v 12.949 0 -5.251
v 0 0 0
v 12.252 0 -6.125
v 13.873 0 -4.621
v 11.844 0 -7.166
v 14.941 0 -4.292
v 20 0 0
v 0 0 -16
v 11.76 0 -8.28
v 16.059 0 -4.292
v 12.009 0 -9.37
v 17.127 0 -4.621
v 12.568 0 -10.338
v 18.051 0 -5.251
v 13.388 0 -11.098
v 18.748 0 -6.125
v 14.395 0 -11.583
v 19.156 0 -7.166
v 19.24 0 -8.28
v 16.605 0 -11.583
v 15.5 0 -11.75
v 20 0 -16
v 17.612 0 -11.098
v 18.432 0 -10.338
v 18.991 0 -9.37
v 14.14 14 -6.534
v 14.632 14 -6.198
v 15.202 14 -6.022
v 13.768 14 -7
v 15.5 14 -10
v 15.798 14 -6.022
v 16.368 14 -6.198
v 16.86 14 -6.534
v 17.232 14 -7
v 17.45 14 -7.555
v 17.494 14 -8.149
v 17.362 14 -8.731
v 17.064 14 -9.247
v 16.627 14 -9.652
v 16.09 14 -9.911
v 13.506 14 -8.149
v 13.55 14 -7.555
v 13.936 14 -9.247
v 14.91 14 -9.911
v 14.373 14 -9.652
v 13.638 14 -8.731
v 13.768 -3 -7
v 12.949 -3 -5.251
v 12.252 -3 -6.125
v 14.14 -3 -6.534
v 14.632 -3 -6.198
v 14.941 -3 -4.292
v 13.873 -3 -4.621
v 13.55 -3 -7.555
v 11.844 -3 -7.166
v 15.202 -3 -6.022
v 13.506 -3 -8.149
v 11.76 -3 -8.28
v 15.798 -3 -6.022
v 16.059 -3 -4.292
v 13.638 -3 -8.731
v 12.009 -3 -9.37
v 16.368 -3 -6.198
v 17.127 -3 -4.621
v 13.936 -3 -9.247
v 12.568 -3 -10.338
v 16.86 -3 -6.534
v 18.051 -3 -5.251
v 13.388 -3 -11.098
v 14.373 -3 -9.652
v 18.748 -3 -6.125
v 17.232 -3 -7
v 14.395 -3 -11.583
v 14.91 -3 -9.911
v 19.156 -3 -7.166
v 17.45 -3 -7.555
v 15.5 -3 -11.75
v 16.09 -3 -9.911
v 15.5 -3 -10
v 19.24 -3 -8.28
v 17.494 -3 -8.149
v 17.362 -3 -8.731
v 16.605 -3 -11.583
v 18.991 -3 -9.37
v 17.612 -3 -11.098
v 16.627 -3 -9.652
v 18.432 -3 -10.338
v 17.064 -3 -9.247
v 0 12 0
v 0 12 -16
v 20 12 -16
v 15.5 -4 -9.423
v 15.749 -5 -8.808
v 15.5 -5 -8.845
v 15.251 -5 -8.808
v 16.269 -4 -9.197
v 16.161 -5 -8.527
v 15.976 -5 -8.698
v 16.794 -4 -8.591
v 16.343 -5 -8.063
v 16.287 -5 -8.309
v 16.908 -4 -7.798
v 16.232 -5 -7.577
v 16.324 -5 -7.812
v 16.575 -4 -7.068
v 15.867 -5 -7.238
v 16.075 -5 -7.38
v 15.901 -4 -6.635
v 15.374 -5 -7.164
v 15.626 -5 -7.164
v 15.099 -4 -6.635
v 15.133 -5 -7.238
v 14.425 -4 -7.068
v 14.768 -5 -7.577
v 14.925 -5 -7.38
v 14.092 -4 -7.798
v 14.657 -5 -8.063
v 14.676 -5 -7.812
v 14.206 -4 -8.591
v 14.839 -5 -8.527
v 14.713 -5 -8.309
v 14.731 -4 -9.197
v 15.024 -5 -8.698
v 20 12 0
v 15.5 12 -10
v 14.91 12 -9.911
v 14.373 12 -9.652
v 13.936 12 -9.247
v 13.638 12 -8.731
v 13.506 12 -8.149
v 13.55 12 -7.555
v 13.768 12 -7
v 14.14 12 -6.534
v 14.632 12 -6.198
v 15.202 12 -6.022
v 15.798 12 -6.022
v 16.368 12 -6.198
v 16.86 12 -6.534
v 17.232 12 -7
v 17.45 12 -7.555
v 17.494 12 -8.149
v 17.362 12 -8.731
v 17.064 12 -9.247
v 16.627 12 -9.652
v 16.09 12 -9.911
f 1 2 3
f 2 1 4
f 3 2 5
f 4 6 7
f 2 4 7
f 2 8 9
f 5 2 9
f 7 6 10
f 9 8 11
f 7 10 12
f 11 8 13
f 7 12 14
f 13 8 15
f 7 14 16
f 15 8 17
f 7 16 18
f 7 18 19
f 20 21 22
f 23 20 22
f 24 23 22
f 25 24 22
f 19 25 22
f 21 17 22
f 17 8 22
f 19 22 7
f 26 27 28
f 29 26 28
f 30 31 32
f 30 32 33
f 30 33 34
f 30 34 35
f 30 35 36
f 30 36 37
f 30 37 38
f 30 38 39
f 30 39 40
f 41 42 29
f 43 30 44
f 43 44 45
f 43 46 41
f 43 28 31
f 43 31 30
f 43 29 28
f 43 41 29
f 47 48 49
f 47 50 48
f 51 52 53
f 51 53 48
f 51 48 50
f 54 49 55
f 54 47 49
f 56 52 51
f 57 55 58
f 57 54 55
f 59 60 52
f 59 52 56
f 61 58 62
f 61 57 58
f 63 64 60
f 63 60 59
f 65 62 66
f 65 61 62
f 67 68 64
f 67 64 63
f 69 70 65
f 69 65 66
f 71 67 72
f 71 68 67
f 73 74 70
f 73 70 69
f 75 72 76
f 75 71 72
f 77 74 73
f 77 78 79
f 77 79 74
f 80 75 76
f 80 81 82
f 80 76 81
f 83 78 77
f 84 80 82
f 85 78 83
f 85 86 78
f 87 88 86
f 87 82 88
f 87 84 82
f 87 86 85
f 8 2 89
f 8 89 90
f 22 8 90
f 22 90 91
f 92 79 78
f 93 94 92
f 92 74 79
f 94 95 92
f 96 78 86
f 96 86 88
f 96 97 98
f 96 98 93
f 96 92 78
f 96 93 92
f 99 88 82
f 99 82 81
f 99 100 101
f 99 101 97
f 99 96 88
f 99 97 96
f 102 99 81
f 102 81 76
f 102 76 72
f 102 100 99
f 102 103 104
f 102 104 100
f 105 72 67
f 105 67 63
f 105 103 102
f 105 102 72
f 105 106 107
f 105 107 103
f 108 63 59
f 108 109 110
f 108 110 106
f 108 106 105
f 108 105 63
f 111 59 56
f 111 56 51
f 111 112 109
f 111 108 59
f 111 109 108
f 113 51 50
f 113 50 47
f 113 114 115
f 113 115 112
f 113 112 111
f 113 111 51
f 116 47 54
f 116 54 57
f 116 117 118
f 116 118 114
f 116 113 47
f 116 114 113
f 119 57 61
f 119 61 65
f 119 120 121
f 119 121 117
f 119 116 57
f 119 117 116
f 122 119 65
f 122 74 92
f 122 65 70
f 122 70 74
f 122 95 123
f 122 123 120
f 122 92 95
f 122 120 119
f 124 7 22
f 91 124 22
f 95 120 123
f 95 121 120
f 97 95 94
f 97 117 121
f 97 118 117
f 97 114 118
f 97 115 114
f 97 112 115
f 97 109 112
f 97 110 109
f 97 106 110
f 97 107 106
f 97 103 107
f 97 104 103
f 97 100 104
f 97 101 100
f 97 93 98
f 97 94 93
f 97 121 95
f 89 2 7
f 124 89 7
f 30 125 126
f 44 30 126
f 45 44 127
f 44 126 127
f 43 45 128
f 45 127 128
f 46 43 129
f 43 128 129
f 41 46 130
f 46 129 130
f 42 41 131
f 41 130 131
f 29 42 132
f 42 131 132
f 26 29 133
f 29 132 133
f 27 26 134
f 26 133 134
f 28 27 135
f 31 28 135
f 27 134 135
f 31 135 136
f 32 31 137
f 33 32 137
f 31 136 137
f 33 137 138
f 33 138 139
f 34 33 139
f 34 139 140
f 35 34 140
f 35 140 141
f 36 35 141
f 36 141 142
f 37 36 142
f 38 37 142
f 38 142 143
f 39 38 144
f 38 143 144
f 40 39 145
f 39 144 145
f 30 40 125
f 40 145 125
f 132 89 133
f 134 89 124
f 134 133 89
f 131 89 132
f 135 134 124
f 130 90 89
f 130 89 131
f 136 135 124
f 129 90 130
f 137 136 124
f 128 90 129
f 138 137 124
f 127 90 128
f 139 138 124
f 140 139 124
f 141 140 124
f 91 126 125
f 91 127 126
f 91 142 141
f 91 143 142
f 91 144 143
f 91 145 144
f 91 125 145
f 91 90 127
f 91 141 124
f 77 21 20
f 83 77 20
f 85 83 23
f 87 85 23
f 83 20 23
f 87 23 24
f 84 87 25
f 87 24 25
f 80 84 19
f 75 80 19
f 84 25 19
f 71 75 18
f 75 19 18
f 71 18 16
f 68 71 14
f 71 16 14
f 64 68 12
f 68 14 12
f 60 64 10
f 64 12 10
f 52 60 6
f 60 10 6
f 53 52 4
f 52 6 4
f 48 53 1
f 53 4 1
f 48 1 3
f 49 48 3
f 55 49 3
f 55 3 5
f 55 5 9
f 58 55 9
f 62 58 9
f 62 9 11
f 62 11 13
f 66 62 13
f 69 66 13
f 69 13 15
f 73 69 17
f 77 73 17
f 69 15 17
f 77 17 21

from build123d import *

# Parameters (mm, degrees)
SKETCH_1_W      = 20
SKETCH_1_H      = 16
EXTRUDE_1_DEPTH = 12
SKETCH_2_R      = 2
EXTRUDE_2_DEPTH = 2
SKETCH_3_R      = 3.75
EXTRUDE_3_DEPTH = 3
SKETCH_4_R      = 2
EXTRUDE_4_DEPTH = 2
EXTRUDE_4_TAPER = 30


with BuildPart() as part:
    # Эскиз1 → Бобышка-Вытянуть1 (new body)
    with BuildSketch(Plane(origin=(0, 0, 0), x_dir=(1, 0, 0), z_dir=(0, 1, 0))):
        with Locations((10, 8)):
            Rectangle(SKETCH_1_W, SKETCH_1_H)
    extrude(amount=EXTRUDE_1_DEPTH)

    # Эскиз2 → Бобышка-Вытянуть2 (add)
    with BuildSketch(Plane(origin=(0, 12, 0), x_dir=(1, 0, 0), z_dir=(0, 1, 0))):
        with Locations(Location((15.5, 8, 0), (0, 0, 90))):
            Circle(SKETCH_2_R)
    extrude(amount=EXTRUDE_2_DEPTH)

    # Эскиз3 → Бобышка-Вытянуть3 (add)
    with BuildSketch(Plane.XZ):
        with Locations(Location((15.5, -8, 0), (0, 0, 270))):
            Circle(SKETCH_3_R)
    extrude(amount=EXTRUDE_3_DEPTH)

    # Эскиз4 → Бобышка-Вытянуть4 (add)
    with BuildSketch(Plane.XZ.offset(3)):
        with Locations(Location((15.5, -8, 0), (0, 0, 270))):
            Circle(SKETCH_4_R)
    extrude(amount=EXTRUDE_4_DEPTH, taper=EXTRUDE_4_TAPER)


solid = part.part
